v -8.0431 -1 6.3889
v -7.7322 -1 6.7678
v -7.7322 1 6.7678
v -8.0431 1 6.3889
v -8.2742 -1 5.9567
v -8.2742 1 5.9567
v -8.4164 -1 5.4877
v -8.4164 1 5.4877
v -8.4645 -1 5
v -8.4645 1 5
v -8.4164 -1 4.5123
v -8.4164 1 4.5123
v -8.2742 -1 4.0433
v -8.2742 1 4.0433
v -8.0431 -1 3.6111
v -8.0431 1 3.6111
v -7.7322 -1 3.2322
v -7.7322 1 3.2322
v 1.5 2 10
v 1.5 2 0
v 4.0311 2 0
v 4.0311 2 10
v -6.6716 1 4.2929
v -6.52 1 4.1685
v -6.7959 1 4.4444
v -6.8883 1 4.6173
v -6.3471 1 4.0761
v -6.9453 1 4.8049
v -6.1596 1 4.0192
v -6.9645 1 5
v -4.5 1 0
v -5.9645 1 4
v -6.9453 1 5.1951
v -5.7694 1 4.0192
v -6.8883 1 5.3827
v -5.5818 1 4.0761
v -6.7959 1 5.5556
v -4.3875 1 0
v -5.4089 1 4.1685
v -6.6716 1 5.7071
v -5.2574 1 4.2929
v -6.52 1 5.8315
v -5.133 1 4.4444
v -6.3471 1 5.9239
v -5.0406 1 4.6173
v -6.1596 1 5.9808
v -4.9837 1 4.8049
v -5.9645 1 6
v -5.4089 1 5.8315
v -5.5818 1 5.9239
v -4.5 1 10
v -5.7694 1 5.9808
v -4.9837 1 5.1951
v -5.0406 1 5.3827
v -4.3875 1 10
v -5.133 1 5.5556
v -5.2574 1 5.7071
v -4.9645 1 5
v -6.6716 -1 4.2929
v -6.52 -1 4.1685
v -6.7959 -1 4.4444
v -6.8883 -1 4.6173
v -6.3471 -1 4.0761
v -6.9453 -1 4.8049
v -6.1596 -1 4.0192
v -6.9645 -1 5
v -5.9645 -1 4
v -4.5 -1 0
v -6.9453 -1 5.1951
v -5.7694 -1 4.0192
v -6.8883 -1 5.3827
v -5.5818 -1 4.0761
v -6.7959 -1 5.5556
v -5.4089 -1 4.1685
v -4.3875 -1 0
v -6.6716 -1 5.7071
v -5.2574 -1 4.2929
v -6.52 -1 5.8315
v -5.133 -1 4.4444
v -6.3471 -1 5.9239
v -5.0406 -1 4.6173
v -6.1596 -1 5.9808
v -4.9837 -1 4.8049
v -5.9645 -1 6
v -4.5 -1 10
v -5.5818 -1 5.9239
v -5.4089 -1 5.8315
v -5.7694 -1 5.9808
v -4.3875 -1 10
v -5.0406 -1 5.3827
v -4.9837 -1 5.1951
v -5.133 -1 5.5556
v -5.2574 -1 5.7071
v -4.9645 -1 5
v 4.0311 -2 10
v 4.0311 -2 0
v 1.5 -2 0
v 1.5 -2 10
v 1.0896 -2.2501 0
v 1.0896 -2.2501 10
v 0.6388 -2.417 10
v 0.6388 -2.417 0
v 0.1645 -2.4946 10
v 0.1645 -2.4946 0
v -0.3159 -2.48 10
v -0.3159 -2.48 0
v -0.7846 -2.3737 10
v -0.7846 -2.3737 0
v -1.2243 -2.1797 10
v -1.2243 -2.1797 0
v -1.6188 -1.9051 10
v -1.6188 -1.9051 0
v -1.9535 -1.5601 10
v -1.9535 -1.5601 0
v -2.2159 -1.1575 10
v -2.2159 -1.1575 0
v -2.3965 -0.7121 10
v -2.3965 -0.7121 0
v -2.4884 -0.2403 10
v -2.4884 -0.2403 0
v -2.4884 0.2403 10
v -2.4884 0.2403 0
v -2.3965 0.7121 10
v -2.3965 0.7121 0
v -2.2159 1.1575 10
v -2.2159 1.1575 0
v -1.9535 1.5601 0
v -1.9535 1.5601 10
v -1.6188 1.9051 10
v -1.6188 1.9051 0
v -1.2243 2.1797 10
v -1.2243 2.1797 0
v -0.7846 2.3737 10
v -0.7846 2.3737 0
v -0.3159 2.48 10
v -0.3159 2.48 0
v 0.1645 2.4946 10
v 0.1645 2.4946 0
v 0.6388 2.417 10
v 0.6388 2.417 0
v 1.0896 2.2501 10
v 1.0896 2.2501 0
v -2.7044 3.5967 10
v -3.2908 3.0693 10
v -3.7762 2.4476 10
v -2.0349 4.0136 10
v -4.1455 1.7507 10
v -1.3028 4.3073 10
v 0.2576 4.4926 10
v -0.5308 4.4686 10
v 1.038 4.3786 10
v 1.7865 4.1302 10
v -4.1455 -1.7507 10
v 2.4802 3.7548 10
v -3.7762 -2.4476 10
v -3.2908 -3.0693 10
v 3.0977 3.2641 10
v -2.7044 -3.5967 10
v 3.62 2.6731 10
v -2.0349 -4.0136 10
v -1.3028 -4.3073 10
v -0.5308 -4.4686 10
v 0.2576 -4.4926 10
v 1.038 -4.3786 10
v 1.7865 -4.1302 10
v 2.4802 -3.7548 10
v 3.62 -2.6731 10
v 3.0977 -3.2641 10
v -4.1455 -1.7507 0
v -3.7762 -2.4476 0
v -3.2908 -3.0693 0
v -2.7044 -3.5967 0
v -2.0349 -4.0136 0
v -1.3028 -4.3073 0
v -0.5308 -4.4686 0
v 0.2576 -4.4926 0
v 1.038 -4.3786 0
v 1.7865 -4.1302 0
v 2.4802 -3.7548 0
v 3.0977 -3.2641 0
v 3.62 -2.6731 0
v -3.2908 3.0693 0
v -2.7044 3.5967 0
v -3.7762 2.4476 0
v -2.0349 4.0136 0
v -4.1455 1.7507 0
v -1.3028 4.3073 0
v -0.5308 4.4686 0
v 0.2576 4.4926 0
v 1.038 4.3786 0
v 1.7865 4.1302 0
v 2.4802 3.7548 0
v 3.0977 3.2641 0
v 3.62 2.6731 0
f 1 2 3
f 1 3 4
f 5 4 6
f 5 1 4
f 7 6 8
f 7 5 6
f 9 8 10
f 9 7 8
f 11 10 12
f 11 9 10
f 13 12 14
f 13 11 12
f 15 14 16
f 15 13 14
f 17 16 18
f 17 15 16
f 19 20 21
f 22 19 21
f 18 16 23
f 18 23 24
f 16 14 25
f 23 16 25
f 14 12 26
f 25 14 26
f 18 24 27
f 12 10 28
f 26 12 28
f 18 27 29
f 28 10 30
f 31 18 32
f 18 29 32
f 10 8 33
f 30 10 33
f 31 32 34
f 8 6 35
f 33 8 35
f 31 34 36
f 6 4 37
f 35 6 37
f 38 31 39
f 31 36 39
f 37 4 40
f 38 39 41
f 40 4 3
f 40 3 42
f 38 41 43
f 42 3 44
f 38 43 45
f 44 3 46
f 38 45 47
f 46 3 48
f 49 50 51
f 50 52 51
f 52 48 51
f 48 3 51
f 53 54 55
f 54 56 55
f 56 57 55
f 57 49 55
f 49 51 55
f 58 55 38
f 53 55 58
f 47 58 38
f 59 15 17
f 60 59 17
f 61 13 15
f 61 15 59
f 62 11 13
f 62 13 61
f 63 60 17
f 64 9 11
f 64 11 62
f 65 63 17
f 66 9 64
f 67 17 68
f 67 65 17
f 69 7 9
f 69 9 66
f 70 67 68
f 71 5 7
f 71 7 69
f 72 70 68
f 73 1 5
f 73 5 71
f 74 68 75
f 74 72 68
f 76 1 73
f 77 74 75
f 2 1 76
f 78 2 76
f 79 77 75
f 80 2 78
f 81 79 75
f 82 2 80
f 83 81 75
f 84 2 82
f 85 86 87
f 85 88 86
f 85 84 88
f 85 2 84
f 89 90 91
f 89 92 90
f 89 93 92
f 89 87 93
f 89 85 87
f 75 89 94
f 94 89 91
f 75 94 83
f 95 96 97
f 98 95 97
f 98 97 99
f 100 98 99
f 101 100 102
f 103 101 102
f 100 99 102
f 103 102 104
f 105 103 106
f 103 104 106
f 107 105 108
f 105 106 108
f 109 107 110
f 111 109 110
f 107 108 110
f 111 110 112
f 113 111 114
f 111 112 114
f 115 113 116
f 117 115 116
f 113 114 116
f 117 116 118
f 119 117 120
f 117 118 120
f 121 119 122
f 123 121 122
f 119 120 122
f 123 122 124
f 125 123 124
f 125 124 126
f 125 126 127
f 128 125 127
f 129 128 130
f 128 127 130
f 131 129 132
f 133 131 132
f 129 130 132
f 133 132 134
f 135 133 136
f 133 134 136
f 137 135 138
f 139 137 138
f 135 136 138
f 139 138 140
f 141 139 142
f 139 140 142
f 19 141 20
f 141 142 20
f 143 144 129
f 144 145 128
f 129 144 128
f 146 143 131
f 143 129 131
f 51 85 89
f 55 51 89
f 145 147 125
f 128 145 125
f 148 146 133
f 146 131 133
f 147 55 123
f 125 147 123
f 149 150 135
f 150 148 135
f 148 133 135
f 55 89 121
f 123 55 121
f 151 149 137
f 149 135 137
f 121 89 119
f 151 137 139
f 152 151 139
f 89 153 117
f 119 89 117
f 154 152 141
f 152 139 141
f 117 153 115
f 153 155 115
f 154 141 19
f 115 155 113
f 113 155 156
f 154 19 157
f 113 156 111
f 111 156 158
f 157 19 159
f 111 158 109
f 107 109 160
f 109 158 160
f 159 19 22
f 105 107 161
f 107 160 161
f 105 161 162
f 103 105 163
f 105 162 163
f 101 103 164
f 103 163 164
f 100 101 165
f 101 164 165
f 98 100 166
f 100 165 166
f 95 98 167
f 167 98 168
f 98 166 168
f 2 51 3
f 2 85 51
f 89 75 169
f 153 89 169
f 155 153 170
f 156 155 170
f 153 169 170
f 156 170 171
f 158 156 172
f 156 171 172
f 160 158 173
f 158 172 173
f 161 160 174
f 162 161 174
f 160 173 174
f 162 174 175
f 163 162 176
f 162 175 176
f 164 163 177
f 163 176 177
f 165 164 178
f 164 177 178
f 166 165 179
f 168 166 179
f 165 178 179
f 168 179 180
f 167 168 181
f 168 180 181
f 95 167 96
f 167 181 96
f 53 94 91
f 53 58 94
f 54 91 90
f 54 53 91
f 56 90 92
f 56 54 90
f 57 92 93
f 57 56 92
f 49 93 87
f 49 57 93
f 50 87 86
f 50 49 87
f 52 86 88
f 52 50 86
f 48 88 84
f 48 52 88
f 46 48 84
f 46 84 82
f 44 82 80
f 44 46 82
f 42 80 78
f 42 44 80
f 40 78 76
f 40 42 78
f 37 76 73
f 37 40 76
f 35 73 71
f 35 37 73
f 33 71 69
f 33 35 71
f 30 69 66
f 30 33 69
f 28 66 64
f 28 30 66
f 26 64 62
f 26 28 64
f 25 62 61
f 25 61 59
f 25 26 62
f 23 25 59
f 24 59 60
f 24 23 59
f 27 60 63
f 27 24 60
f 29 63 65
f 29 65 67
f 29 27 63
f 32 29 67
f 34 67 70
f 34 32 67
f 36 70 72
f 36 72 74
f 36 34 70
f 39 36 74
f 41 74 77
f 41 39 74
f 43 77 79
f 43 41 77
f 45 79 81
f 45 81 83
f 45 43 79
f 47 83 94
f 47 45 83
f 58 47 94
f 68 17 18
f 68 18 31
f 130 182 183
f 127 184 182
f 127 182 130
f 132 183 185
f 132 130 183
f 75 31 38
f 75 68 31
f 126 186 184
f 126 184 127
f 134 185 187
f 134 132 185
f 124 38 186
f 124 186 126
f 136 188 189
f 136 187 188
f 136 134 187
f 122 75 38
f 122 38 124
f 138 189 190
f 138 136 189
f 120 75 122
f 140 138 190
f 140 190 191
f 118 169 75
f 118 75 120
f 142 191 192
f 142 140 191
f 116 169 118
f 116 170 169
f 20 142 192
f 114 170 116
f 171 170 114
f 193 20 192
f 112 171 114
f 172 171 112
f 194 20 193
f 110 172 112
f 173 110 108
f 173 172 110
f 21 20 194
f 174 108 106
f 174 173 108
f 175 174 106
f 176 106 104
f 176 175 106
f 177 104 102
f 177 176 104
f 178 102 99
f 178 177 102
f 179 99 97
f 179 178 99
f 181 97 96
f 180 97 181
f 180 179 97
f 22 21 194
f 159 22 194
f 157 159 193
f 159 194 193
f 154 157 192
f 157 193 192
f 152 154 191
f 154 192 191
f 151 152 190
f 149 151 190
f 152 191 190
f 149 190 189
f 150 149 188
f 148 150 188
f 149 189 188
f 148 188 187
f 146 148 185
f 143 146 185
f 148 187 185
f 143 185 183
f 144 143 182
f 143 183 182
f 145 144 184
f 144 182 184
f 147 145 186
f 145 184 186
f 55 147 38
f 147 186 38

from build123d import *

# Parameters (mm, degrees)
F1_DEPTH = 10
F2_R     = 1
F2_W     = 0.686881559
F2_H     = 10
F3_DEPTH = 1


with BuildPart() as f1:
    # F0 (on Top) → F1 (new body)
    with BuildSketch(Plane.XY):
        with BuildLine():
            Line((1.5, 2), (4.0311288741, 2))
            ThreePointArc((4.0311288741, 2), (-4.5, 0), (4.0311288741, -2))
            Line((4.0311288741, -2), (1.5, -2))
            ThreePointArc((1.5, -2), (-2.5, 0), (1.5, 2))
        make_face()
    extrude(amount=F1_DEPTH)

    # F2 (on Front) → F3 (join, symmetric)
    with BuildSketch(Plane.XZ):
        with BuildLine():
            Line((-4.5, 10), (-7.732233047, 6.767766953))
            ThreePointArc((-7.732233047, 6.767766953), (-8.4644660941, 5), (-7.732233047, 3.232233047))
            Line((-7.732233047, 3.232233047), (-4.5, 0))
            Line((-4.5, 0), (-4.5, 10))
        make_face()
        with Locations((-5.9644660941, 5)):
            Circle(F2_R, mode=Mode.SUBTRACT)
        with Locations((-4.1565592205, 5)):
            Rectangle(F2_W, F2_H)
    extrude(amount=F3_DEPTH, both=True)


solid = f1.part
